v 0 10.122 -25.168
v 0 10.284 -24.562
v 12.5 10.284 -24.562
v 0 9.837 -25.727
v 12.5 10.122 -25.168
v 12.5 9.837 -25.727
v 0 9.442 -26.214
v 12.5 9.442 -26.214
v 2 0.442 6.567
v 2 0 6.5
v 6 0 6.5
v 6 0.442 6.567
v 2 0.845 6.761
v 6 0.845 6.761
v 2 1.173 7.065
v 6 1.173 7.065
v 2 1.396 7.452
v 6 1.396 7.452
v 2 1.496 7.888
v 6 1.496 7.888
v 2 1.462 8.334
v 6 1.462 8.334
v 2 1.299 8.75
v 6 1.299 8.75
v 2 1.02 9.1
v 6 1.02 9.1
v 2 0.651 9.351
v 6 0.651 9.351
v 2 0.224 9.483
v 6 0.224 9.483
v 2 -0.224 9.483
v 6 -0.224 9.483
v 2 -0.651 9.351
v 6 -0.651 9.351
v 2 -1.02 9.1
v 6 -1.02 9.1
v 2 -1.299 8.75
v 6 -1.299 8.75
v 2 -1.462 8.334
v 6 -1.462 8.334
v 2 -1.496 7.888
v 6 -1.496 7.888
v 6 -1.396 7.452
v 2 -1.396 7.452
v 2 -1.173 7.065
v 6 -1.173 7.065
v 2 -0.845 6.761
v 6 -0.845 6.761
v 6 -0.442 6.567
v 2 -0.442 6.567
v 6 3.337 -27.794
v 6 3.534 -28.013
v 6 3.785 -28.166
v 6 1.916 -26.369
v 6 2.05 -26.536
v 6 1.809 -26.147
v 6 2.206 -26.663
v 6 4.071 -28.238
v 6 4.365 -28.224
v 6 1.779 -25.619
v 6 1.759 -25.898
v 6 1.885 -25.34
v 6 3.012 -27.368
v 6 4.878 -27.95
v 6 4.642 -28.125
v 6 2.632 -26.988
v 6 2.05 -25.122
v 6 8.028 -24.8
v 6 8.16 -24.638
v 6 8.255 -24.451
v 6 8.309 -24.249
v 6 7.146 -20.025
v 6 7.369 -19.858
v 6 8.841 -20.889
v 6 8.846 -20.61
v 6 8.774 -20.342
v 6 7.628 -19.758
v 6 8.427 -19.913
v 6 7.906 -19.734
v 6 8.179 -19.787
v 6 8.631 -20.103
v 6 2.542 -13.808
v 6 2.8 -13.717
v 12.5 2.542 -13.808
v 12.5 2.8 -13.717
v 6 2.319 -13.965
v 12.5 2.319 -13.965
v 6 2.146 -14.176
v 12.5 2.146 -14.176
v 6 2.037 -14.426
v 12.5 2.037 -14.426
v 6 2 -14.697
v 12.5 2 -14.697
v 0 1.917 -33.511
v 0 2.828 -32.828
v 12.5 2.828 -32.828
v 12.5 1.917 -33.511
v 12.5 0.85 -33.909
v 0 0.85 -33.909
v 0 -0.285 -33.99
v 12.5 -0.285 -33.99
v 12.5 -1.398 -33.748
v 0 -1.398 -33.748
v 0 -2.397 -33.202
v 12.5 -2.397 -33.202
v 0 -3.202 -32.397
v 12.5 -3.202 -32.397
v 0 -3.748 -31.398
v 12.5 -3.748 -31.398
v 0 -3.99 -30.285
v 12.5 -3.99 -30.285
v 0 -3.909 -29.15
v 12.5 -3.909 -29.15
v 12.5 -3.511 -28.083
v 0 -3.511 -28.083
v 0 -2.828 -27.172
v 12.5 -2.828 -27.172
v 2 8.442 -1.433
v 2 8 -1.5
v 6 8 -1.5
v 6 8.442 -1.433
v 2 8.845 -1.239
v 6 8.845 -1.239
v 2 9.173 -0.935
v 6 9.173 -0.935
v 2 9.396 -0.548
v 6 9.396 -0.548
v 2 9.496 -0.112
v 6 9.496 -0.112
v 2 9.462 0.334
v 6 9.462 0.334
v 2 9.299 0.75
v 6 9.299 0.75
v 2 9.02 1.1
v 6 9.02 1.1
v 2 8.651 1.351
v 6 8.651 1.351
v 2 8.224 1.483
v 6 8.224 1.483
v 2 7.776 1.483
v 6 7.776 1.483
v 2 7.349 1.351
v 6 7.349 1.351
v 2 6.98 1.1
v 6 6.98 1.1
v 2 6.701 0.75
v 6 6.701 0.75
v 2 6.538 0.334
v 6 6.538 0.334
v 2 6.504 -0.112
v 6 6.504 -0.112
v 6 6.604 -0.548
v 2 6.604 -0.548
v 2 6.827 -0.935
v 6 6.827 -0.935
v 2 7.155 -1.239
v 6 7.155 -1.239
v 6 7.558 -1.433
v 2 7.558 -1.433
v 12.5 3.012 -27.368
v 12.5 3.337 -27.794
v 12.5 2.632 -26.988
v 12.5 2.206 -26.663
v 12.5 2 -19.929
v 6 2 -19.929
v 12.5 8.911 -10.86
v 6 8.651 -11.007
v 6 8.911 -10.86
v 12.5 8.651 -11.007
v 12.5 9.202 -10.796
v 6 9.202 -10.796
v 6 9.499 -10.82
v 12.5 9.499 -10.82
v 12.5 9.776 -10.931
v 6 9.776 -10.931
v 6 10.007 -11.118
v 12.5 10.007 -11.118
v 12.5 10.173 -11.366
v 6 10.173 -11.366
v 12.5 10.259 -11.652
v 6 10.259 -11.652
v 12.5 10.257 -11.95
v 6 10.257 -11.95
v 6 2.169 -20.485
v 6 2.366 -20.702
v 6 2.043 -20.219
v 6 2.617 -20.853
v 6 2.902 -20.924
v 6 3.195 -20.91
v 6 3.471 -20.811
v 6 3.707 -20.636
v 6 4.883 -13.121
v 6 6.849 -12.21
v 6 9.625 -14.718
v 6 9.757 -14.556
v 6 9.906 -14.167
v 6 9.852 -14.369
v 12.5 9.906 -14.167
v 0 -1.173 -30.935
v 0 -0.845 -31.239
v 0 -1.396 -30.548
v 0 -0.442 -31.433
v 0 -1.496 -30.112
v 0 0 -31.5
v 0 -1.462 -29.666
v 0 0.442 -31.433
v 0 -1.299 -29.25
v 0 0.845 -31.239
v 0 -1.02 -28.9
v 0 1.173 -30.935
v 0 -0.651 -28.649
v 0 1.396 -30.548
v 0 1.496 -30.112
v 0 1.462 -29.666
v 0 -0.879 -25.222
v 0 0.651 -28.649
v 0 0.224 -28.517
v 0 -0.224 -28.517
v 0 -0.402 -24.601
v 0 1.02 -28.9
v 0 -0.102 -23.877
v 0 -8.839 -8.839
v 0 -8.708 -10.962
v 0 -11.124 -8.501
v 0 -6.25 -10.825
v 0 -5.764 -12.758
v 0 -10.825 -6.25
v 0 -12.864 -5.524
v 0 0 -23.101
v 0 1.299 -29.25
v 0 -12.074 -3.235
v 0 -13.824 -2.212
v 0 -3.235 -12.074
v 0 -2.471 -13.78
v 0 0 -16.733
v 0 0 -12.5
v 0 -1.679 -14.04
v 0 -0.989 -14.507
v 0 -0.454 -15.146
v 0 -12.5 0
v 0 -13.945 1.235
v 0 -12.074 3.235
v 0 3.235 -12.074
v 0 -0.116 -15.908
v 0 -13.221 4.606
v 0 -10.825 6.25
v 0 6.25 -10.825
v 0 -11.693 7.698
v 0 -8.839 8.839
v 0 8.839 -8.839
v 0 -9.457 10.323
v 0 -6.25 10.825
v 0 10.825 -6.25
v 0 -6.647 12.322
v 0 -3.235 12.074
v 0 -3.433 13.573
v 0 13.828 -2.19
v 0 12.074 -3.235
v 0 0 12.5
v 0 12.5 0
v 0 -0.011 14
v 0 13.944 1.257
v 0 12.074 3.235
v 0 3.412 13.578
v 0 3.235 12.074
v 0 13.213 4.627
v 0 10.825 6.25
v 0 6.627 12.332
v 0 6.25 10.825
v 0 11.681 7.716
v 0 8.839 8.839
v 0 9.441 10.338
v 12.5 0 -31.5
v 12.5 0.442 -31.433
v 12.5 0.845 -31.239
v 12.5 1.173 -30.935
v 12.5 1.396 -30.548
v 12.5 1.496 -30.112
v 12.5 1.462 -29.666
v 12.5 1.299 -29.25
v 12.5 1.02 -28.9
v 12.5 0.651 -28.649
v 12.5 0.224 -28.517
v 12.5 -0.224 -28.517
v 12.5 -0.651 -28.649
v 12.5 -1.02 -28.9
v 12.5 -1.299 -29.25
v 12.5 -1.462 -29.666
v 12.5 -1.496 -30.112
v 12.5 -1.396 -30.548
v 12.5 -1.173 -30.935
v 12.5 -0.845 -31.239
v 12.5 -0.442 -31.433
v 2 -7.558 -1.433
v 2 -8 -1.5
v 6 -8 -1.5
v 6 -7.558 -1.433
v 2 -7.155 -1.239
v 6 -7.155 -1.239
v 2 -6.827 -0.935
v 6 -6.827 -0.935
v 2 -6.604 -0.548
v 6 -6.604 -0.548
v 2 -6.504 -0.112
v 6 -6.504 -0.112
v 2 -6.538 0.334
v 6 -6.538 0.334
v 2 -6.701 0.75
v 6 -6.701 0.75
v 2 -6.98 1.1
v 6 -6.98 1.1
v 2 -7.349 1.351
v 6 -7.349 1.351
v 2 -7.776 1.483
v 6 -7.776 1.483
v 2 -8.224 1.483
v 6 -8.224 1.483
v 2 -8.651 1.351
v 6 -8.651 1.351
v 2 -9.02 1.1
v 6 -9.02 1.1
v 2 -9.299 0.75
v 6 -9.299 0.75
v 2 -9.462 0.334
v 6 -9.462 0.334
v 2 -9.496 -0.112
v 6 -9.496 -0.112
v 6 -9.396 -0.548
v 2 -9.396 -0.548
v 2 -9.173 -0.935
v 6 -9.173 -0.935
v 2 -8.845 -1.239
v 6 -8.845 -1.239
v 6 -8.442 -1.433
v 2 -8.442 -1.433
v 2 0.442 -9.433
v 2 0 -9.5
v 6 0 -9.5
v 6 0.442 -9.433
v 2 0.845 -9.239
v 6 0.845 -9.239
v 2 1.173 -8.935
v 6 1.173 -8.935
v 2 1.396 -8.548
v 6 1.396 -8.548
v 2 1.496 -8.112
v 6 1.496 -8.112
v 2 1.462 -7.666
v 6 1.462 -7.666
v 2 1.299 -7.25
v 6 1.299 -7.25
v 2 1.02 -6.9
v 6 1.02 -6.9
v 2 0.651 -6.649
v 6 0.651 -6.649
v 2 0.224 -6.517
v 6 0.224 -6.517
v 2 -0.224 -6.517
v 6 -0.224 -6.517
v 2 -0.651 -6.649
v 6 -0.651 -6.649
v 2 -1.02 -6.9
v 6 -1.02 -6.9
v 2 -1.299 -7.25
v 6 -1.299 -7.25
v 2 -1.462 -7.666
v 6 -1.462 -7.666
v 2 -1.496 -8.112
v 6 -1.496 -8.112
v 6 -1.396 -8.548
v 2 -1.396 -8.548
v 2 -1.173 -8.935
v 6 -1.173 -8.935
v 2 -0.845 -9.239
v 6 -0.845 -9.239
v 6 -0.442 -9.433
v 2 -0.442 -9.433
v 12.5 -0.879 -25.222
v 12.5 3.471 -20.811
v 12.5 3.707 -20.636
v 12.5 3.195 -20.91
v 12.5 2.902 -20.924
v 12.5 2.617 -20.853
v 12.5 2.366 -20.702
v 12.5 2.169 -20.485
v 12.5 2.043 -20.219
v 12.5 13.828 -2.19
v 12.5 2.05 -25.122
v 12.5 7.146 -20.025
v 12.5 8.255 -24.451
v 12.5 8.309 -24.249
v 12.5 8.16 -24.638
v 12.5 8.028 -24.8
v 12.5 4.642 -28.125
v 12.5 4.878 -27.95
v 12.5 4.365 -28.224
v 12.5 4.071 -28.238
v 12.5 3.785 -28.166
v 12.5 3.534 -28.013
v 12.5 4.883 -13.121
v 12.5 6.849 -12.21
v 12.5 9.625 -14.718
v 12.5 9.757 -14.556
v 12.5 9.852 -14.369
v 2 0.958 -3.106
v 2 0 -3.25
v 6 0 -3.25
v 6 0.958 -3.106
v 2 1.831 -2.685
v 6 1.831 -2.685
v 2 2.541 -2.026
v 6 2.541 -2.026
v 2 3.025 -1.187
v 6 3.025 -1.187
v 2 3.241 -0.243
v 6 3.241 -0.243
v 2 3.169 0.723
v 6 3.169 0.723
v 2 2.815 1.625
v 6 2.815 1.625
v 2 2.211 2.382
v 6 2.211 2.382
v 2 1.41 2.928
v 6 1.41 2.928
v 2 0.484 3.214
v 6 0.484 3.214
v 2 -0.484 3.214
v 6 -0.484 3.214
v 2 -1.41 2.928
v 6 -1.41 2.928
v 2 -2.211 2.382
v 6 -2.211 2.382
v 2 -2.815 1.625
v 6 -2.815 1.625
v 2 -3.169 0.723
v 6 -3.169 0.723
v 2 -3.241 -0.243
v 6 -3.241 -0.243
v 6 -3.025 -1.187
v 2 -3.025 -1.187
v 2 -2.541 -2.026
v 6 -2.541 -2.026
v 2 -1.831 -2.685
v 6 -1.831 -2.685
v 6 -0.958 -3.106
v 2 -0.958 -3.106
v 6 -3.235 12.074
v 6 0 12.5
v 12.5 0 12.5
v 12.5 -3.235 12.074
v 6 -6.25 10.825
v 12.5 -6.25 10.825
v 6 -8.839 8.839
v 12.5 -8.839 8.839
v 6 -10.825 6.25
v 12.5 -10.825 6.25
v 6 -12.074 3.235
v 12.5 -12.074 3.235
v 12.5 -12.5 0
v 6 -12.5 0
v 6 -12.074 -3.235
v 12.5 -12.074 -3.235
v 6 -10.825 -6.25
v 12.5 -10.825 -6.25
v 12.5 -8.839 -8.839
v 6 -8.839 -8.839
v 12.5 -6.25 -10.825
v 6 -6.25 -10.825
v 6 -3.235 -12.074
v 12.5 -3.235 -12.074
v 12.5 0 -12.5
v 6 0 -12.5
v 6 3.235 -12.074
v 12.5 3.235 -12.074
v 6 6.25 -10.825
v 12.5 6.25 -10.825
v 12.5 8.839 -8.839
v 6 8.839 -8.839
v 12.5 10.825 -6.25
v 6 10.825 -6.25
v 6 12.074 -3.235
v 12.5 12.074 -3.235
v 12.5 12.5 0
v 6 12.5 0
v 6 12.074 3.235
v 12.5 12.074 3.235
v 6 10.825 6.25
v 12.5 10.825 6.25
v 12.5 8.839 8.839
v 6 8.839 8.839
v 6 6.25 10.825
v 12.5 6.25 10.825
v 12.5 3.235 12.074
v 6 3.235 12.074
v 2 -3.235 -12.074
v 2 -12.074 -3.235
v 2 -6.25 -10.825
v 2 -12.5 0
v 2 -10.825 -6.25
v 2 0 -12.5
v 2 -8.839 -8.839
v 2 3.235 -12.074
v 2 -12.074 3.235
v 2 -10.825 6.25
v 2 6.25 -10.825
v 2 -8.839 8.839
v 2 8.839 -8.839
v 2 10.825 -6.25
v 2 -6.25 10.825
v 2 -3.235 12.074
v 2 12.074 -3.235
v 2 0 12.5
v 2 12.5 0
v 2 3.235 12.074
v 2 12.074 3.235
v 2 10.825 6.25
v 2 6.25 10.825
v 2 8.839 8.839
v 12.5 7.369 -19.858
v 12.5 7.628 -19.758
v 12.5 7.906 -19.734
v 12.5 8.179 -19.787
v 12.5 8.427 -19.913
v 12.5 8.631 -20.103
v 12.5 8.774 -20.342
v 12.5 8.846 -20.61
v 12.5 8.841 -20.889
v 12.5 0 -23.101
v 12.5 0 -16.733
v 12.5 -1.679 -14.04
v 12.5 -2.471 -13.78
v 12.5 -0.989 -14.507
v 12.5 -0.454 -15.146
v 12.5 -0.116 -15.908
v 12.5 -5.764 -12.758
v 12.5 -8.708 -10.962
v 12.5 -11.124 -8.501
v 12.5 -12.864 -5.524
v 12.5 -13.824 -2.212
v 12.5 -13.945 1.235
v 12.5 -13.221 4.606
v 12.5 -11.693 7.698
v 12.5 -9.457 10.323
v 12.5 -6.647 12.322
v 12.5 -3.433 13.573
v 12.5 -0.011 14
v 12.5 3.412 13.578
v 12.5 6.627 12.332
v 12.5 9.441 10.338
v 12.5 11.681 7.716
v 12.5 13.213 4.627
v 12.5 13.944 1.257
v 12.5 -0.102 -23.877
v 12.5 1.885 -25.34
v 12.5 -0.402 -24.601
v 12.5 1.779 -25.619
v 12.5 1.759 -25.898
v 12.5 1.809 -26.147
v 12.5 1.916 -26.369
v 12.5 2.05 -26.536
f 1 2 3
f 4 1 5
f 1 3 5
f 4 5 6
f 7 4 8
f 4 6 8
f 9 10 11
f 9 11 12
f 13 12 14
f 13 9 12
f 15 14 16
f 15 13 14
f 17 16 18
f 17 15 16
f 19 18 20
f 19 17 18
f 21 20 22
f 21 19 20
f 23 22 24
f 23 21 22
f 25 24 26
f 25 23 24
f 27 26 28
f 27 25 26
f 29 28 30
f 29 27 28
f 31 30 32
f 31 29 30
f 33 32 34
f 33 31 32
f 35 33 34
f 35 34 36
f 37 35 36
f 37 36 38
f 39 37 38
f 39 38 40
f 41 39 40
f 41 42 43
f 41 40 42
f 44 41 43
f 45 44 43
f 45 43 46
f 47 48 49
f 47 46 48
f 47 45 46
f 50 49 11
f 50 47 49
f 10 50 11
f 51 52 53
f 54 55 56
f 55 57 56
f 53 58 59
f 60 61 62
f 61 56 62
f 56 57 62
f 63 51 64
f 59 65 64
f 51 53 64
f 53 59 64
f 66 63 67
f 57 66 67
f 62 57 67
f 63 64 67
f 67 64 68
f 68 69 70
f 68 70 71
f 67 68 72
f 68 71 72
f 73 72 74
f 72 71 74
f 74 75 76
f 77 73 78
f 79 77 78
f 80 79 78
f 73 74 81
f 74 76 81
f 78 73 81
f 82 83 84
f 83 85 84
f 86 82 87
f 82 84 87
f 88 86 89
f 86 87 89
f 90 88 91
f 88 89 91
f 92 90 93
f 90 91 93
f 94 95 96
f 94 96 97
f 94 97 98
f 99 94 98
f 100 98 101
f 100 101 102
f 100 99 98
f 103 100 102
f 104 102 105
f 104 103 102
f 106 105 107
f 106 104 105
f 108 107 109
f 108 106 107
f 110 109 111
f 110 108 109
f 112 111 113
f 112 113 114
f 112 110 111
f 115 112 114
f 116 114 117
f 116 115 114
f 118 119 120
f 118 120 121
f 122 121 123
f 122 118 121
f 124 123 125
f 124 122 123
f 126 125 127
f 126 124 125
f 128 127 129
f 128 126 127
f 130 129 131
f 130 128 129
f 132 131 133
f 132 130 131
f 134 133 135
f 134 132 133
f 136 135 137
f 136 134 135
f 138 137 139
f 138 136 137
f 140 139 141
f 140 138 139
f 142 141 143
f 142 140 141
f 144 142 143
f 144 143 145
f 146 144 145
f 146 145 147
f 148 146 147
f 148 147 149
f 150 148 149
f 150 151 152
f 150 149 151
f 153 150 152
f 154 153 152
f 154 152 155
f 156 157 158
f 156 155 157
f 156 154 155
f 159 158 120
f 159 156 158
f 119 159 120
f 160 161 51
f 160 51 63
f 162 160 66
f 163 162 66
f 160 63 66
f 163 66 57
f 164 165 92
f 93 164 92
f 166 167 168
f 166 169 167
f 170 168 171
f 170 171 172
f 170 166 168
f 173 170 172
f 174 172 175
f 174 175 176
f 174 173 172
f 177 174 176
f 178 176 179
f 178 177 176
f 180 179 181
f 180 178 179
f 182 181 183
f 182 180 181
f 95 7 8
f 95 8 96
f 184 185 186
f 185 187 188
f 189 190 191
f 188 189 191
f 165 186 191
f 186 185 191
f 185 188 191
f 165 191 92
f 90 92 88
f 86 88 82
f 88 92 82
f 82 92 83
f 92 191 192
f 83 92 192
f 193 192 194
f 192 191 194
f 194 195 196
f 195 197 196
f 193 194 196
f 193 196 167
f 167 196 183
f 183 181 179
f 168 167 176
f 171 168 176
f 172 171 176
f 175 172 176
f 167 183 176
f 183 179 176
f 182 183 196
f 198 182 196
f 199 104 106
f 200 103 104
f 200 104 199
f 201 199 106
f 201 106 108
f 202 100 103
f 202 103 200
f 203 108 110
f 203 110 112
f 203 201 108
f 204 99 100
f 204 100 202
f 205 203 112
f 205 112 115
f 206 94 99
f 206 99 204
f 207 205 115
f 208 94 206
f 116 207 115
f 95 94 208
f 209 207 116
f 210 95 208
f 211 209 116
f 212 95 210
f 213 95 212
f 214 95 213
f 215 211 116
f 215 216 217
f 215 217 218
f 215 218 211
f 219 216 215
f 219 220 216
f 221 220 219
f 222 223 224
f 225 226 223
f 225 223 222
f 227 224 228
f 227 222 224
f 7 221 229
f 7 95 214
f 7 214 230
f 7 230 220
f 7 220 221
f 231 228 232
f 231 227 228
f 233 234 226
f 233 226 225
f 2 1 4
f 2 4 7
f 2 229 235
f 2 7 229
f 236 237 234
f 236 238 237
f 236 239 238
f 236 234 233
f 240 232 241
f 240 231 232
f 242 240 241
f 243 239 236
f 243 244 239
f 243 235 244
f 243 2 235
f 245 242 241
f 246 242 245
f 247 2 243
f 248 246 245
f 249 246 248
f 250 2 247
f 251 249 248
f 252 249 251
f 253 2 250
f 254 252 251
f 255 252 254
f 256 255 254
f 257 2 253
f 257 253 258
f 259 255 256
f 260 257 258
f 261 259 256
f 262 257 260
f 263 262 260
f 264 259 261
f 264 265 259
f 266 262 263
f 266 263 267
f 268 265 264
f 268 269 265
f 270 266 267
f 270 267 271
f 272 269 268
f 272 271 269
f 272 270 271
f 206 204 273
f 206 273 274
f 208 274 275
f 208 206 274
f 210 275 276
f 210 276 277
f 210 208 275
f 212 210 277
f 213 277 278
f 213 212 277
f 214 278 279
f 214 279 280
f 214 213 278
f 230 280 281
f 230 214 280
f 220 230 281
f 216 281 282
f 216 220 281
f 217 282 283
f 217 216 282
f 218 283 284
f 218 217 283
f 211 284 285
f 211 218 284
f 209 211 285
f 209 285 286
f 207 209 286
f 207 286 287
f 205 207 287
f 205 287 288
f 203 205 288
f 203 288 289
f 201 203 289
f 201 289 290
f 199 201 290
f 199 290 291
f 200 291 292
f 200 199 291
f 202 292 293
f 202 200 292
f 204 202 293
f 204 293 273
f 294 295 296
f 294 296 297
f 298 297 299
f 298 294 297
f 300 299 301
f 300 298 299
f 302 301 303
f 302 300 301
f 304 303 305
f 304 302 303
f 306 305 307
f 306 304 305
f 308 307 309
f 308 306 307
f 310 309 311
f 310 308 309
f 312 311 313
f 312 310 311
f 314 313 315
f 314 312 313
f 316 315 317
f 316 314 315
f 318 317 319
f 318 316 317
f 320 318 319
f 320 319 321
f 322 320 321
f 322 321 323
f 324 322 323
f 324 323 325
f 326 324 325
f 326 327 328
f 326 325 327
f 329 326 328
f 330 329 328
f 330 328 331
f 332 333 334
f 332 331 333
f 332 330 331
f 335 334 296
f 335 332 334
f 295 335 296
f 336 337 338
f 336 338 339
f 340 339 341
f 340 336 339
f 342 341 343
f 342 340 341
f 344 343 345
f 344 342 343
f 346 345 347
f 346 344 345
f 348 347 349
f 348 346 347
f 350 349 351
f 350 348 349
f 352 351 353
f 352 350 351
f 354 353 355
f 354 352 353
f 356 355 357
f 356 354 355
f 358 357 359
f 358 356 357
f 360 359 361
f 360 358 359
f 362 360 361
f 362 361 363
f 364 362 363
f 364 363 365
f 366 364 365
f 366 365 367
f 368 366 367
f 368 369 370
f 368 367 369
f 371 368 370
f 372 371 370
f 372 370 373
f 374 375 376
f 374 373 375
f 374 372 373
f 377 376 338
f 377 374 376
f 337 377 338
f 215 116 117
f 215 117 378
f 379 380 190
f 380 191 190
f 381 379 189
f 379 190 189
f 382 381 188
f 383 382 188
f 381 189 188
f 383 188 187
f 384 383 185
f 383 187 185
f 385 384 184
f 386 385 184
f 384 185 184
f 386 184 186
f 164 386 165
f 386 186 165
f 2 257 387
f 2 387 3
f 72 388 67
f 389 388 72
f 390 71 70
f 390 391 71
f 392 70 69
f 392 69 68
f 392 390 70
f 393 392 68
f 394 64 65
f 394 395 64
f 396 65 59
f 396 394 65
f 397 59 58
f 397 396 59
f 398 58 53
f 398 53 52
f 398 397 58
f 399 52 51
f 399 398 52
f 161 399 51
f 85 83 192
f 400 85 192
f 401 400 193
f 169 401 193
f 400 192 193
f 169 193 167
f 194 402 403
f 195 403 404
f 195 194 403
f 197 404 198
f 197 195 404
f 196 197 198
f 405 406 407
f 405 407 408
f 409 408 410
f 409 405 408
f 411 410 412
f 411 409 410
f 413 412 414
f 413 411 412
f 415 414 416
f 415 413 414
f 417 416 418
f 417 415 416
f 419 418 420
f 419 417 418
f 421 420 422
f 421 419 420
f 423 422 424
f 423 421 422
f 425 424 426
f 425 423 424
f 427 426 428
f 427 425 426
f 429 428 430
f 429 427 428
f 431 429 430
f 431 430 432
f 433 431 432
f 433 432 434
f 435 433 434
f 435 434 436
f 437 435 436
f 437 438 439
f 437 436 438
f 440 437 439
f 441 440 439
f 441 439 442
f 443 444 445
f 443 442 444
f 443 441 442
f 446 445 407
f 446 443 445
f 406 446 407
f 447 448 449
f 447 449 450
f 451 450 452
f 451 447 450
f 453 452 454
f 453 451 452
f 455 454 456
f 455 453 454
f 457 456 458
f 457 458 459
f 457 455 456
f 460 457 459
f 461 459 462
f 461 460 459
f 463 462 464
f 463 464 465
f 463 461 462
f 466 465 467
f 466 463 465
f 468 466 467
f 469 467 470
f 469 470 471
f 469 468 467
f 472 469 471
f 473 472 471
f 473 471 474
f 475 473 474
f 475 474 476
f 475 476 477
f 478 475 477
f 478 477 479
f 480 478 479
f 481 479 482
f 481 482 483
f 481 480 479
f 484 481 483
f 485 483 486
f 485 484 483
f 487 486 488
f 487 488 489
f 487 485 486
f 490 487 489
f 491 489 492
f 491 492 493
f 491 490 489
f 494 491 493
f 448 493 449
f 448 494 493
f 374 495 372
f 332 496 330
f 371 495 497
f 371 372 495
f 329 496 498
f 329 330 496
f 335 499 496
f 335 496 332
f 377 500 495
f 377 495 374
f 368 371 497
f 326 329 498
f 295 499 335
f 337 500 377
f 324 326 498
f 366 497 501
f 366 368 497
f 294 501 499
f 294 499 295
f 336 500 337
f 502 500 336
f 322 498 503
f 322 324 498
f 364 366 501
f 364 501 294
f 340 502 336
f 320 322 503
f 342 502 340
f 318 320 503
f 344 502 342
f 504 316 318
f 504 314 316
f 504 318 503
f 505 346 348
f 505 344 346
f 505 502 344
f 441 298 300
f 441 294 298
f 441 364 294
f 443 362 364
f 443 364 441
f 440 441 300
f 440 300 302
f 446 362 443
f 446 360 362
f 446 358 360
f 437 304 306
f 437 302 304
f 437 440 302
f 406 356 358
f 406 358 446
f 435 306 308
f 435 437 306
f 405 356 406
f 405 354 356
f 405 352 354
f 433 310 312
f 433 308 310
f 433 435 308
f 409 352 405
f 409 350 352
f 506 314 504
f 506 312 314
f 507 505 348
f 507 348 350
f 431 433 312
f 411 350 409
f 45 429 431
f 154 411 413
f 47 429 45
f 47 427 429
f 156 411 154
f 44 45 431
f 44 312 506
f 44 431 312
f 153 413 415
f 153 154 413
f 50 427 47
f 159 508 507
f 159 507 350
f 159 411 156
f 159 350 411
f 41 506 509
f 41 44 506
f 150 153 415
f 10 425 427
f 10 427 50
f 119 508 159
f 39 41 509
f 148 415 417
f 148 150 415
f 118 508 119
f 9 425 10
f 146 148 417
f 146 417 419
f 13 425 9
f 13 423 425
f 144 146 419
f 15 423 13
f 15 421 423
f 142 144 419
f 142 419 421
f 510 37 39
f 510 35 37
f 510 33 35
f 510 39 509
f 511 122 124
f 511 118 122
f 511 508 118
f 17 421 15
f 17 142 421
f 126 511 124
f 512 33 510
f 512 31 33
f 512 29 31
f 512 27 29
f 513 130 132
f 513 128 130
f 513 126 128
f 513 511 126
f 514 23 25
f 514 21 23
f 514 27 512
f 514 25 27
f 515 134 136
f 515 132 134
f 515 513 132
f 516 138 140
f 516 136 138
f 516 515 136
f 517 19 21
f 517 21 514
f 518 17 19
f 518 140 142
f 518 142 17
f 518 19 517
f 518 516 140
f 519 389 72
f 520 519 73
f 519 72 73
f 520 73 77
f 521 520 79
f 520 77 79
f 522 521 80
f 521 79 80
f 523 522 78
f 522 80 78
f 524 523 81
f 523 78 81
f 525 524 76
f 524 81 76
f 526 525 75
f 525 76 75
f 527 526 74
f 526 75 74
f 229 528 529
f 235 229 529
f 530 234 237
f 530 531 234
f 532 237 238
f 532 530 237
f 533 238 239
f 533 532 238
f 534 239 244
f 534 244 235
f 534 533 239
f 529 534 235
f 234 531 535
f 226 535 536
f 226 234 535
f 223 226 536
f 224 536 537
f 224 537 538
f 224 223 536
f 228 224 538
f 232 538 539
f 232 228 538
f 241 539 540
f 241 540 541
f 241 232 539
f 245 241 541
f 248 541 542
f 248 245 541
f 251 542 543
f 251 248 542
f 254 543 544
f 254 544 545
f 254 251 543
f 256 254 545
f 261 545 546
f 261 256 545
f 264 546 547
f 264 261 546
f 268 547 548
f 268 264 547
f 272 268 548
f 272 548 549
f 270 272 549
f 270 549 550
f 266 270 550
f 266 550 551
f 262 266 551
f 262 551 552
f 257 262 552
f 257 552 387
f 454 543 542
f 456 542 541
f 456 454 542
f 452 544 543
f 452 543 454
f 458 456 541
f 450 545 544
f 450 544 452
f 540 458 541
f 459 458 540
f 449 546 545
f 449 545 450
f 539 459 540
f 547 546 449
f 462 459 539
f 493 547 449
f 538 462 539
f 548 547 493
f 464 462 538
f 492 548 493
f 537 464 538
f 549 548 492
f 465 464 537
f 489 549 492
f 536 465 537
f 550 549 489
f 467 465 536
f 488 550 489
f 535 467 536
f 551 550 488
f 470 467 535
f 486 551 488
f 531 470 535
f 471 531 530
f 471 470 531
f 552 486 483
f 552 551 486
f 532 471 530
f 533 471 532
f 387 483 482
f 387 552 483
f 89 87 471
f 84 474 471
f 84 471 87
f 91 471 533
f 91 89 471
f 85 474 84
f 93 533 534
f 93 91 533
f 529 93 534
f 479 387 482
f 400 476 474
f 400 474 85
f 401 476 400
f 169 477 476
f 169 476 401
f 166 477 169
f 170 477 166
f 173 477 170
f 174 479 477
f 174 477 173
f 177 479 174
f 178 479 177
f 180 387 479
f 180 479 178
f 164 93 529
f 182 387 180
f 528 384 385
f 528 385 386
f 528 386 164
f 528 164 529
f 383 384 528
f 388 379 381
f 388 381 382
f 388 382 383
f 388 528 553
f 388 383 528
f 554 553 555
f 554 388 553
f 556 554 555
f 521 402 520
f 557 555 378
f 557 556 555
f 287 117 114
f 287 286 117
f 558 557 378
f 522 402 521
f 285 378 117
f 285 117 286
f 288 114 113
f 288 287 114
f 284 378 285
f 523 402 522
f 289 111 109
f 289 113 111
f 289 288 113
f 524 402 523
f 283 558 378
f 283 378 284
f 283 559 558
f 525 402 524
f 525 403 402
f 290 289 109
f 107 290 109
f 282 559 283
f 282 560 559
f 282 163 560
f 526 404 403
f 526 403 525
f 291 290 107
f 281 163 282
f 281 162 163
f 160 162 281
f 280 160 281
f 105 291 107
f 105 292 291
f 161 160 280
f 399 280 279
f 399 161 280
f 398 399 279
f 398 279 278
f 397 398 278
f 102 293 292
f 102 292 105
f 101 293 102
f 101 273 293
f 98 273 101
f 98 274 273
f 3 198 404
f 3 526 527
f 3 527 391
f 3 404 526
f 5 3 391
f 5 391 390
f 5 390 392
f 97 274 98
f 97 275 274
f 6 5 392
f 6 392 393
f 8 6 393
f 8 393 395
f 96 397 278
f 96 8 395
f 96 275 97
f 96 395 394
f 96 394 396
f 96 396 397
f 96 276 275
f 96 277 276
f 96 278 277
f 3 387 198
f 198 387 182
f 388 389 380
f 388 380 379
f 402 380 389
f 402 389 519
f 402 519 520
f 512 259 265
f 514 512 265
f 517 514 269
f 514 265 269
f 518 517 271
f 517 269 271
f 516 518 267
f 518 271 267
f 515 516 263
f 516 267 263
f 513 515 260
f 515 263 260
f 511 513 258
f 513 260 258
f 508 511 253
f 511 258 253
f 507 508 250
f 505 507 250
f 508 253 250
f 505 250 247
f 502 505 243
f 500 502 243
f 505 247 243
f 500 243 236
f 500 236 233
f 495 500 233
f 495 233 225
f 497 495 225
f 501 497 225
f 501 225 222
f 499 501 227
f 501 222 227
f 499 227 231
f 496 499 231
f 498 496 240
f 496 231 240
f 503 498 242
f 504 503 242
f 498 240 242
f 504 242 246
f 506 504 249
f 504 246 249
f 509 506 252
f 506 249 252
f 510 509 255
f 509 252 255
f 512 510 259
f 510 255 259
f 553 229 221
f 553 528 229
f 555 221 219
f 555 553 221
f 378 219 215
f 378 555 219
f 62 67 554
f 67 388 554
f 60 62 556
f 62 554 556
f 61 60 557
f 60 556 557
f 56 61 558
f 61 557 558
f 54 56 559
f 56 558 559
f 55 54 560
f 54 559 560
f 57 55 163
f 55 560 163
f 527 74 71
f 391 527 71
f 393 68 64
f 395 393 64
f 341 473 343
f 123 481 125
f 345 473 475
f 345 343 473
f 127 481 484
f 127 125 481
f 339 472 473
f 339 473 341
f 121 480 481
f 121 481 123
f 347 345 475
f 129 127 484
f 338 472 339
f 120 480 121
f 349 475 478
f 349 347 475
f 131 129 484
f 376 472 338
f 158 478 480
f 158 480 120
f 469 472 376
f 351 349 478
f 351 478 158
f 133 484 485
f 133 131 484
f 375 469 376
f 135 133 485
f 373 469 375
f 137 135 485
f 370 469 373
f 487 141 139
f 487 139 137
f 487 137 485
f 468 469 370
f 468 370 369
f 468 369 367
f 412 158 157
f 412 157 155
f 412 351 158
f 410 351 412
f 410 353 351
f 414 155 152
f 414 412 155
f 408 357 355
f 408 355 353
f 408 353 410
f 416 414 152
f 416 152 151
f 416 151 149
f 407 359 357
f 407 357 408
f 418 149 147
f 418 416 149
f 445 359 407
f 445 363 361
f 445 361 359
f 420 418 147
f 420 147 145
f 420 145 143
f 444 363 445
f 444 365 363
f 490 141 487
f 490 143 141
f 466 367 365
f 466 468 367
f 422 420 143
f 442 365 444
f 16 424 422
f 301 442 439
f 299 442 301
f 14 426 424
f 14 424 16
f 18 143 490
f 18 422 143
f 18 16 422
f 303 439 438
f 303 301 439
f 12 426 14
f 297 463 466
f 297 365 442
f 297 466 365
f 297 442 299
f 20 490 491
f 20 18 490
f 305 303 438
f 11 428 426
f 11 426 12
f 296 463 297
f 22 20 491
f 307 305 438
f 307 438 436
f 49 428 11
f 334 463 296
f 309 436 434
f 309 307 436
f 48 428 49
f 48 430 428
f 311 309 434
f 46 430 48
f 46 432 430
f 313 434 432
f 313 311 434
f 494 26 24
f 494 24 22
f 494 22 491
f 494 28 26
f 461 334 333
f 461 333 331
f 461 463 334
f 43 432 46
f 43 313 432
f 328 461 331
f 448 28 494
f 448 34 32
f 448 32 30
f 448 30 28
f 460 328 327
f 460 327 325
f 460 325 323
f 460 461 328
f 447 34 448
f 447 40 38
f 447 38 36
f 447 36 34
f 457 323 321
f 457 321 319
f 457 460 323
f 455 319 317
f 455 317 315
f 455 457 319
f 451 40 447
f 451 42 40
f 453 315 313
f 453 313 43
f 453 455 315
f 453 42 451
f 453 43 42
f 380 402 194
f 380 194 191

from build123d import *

# Parameters (mm, degrees)
SKETCH_1_R          = 3.25
SKETCH_1_R_2        = 1.5
EXTRUDE_1_DEPTH     = 12.5
SKETCH_2_R          = 12.5
CUT_EXTRUDE_1_DEPTH = 2
CUT_EXTRUDE_START   = -6.5
SKETCH_3_R          = 12.5
CUT_EXTRUDE_2_DEPTH = 6.5
EXTRUDE_2_REACH     = 40.836
FILLET_1_R          = 1
FILLET_2_R          = 3


with BuildPart() as part:
    # 草图1 → 凸台-拉伸1 (new body)
    with BuildSketch(Plane(origin=(0, 0, 0), x_dir=(0, 0, -1), z_dir=(1, 0, 0))):
        with BuildLine():
            Line((2.190082511, 13.827636768), (25.525125149, 10.1317291))
            Line((25.525125149, 10.1317291), (32.828427125, 2.828427125))
            ThreePointArc((32.828427125, 2.828427125), (32.828427125, -2.828427125), (27.171572875, -2.828427125))
            Line((27.171572875, -2.828427125), (24.343145751, 0))
            Line((24.343145751, 0), (14, 0))
            ThreePointArc((14, 0), (-10.645683518, -9.092272677), (2.190082511, 13.827636768))
        make_face()
        Circle(SKETCH_1_R, mode=Mode.SUBTRACT)
        with Locations((0, 8)):
            Circle(SKETCH_1_R_2, mode=Mode.SUBTRACT)
        with Locations((8, 0)):
            Circle(SKETCH_1_R_2, mode=Mode.SUBTRACT)
        with Locations((0, -8)):
            Circle(SKETCH_1_R_2, mode=Mode.SUBTRACT)
        with Locations((-8, 0)):
            Circle(SKETCH_1_R_2, mode=Mode.SUBTRACT)
        with Locations((30, 0)):
            Circle(SKETCH_1_R_2, mode=Mode.SUBTRACT)
    extrude(amount=EXTRUDE_1_DEPTH)

    # 草图2 → 切除-拉伸1 (cut)
    with BuildSketch(Plane.ZY):
        Circle(SKETCH_2_R)
    extrude(amount=-CUT_EXTRUDE_1_DEPTH, mode=Mode.SUBTRACT)

    # 草图3 → 切除-拉伸2 (cut)
    with BuildSketch(Plane(origin=(12.5, 0, 0), x_dir=(0, 0, -1), z_dir=(1, 0, 0)).offset(CUT_EXTRUDE_START)):
        with Locations(Location((0, 0, 0), (0, 0, 180))):
            Circle(SKETCH_3_R)
        with BuildLine():
            Line((14, 2), (13.856406461, 2))
            ThreePointArc((13.856406461, 2), (12.232187693, 6.809815287), (8.999535493, 10.724195117))
            Line((8.999535493, 10.724195117), (24.570417428, 8.258009697))
            Line((24.570417428, 8.258009697), (28.96472382, 3.863703305))
            ThreePointArc((28.96472382, 3.863703305), (27.171572875, 2.828427125), (26.136296695, 1.03527618))
            Line((26.136296695, 1.03527618), (25.171572875, 2))
            Line((25.171572875, 2), (14, 2))
        make_face()
    extrude(amount=CUT_EXTRUDE_2_DEPTH, mode=Mode.SUBTRACT)

    # 草图4 → 凸台-拉伸2 (add, up to next)
    with BuildSketch(Plane(origin=(12.5, 0, 0), x_dir=(0, 0, -1), z_dir=(1, 0, 0)), mode=Mode.PRIVATE) as extrude_2_sk1:
        Polygon((25.171572875, 2), (17.848994346, 9.32257853), (14.488282804, 9.854862946), (22.343145751, 2), align=None)
    extrude_2_tool1 = extrude(extrude_2_sk1.sketch, amount=-EXTRUDE_2_REACH, mode=Mode.PRIVATE) - part.part
    add(extrude_2_tool1.solids().sort_by_distance((12.5, 5.795916, -19.944911))[0])

    # 圆角1
    fillet_1_edges = [part.edges().sort_by_distance(p)[0] for p in [
        (9.25, 2, -22.343145751),
        (9.25, 9.854862946, -14.488282804),
        (9.25, 9.32257853, -17.848994346),
        (9.25, 2, -13.856406461),
        (9.25, 10.724195117, -8.999535493),
        (9.25, 8.258009697, -24.570417428),
        (9.25, 3.863703305, -28.96472382),
        (9.25, 1.03527618, -26.136296695),
    ]]
    fillet(fillet_1_edges, radius=FILLET_1_R)

    # 圆角2
    fillet_2_edges = [part.edges().sort_by_distance(p)[0] for p in [
        (6.25, 10.1317291, -25.525125149),
        (6.25, 0, -24.343145751),
        (6.25, 0, -14),
    ]]
    fillet(fillet_2_edges, radius=FILLET_2_R)


solid = part.part
